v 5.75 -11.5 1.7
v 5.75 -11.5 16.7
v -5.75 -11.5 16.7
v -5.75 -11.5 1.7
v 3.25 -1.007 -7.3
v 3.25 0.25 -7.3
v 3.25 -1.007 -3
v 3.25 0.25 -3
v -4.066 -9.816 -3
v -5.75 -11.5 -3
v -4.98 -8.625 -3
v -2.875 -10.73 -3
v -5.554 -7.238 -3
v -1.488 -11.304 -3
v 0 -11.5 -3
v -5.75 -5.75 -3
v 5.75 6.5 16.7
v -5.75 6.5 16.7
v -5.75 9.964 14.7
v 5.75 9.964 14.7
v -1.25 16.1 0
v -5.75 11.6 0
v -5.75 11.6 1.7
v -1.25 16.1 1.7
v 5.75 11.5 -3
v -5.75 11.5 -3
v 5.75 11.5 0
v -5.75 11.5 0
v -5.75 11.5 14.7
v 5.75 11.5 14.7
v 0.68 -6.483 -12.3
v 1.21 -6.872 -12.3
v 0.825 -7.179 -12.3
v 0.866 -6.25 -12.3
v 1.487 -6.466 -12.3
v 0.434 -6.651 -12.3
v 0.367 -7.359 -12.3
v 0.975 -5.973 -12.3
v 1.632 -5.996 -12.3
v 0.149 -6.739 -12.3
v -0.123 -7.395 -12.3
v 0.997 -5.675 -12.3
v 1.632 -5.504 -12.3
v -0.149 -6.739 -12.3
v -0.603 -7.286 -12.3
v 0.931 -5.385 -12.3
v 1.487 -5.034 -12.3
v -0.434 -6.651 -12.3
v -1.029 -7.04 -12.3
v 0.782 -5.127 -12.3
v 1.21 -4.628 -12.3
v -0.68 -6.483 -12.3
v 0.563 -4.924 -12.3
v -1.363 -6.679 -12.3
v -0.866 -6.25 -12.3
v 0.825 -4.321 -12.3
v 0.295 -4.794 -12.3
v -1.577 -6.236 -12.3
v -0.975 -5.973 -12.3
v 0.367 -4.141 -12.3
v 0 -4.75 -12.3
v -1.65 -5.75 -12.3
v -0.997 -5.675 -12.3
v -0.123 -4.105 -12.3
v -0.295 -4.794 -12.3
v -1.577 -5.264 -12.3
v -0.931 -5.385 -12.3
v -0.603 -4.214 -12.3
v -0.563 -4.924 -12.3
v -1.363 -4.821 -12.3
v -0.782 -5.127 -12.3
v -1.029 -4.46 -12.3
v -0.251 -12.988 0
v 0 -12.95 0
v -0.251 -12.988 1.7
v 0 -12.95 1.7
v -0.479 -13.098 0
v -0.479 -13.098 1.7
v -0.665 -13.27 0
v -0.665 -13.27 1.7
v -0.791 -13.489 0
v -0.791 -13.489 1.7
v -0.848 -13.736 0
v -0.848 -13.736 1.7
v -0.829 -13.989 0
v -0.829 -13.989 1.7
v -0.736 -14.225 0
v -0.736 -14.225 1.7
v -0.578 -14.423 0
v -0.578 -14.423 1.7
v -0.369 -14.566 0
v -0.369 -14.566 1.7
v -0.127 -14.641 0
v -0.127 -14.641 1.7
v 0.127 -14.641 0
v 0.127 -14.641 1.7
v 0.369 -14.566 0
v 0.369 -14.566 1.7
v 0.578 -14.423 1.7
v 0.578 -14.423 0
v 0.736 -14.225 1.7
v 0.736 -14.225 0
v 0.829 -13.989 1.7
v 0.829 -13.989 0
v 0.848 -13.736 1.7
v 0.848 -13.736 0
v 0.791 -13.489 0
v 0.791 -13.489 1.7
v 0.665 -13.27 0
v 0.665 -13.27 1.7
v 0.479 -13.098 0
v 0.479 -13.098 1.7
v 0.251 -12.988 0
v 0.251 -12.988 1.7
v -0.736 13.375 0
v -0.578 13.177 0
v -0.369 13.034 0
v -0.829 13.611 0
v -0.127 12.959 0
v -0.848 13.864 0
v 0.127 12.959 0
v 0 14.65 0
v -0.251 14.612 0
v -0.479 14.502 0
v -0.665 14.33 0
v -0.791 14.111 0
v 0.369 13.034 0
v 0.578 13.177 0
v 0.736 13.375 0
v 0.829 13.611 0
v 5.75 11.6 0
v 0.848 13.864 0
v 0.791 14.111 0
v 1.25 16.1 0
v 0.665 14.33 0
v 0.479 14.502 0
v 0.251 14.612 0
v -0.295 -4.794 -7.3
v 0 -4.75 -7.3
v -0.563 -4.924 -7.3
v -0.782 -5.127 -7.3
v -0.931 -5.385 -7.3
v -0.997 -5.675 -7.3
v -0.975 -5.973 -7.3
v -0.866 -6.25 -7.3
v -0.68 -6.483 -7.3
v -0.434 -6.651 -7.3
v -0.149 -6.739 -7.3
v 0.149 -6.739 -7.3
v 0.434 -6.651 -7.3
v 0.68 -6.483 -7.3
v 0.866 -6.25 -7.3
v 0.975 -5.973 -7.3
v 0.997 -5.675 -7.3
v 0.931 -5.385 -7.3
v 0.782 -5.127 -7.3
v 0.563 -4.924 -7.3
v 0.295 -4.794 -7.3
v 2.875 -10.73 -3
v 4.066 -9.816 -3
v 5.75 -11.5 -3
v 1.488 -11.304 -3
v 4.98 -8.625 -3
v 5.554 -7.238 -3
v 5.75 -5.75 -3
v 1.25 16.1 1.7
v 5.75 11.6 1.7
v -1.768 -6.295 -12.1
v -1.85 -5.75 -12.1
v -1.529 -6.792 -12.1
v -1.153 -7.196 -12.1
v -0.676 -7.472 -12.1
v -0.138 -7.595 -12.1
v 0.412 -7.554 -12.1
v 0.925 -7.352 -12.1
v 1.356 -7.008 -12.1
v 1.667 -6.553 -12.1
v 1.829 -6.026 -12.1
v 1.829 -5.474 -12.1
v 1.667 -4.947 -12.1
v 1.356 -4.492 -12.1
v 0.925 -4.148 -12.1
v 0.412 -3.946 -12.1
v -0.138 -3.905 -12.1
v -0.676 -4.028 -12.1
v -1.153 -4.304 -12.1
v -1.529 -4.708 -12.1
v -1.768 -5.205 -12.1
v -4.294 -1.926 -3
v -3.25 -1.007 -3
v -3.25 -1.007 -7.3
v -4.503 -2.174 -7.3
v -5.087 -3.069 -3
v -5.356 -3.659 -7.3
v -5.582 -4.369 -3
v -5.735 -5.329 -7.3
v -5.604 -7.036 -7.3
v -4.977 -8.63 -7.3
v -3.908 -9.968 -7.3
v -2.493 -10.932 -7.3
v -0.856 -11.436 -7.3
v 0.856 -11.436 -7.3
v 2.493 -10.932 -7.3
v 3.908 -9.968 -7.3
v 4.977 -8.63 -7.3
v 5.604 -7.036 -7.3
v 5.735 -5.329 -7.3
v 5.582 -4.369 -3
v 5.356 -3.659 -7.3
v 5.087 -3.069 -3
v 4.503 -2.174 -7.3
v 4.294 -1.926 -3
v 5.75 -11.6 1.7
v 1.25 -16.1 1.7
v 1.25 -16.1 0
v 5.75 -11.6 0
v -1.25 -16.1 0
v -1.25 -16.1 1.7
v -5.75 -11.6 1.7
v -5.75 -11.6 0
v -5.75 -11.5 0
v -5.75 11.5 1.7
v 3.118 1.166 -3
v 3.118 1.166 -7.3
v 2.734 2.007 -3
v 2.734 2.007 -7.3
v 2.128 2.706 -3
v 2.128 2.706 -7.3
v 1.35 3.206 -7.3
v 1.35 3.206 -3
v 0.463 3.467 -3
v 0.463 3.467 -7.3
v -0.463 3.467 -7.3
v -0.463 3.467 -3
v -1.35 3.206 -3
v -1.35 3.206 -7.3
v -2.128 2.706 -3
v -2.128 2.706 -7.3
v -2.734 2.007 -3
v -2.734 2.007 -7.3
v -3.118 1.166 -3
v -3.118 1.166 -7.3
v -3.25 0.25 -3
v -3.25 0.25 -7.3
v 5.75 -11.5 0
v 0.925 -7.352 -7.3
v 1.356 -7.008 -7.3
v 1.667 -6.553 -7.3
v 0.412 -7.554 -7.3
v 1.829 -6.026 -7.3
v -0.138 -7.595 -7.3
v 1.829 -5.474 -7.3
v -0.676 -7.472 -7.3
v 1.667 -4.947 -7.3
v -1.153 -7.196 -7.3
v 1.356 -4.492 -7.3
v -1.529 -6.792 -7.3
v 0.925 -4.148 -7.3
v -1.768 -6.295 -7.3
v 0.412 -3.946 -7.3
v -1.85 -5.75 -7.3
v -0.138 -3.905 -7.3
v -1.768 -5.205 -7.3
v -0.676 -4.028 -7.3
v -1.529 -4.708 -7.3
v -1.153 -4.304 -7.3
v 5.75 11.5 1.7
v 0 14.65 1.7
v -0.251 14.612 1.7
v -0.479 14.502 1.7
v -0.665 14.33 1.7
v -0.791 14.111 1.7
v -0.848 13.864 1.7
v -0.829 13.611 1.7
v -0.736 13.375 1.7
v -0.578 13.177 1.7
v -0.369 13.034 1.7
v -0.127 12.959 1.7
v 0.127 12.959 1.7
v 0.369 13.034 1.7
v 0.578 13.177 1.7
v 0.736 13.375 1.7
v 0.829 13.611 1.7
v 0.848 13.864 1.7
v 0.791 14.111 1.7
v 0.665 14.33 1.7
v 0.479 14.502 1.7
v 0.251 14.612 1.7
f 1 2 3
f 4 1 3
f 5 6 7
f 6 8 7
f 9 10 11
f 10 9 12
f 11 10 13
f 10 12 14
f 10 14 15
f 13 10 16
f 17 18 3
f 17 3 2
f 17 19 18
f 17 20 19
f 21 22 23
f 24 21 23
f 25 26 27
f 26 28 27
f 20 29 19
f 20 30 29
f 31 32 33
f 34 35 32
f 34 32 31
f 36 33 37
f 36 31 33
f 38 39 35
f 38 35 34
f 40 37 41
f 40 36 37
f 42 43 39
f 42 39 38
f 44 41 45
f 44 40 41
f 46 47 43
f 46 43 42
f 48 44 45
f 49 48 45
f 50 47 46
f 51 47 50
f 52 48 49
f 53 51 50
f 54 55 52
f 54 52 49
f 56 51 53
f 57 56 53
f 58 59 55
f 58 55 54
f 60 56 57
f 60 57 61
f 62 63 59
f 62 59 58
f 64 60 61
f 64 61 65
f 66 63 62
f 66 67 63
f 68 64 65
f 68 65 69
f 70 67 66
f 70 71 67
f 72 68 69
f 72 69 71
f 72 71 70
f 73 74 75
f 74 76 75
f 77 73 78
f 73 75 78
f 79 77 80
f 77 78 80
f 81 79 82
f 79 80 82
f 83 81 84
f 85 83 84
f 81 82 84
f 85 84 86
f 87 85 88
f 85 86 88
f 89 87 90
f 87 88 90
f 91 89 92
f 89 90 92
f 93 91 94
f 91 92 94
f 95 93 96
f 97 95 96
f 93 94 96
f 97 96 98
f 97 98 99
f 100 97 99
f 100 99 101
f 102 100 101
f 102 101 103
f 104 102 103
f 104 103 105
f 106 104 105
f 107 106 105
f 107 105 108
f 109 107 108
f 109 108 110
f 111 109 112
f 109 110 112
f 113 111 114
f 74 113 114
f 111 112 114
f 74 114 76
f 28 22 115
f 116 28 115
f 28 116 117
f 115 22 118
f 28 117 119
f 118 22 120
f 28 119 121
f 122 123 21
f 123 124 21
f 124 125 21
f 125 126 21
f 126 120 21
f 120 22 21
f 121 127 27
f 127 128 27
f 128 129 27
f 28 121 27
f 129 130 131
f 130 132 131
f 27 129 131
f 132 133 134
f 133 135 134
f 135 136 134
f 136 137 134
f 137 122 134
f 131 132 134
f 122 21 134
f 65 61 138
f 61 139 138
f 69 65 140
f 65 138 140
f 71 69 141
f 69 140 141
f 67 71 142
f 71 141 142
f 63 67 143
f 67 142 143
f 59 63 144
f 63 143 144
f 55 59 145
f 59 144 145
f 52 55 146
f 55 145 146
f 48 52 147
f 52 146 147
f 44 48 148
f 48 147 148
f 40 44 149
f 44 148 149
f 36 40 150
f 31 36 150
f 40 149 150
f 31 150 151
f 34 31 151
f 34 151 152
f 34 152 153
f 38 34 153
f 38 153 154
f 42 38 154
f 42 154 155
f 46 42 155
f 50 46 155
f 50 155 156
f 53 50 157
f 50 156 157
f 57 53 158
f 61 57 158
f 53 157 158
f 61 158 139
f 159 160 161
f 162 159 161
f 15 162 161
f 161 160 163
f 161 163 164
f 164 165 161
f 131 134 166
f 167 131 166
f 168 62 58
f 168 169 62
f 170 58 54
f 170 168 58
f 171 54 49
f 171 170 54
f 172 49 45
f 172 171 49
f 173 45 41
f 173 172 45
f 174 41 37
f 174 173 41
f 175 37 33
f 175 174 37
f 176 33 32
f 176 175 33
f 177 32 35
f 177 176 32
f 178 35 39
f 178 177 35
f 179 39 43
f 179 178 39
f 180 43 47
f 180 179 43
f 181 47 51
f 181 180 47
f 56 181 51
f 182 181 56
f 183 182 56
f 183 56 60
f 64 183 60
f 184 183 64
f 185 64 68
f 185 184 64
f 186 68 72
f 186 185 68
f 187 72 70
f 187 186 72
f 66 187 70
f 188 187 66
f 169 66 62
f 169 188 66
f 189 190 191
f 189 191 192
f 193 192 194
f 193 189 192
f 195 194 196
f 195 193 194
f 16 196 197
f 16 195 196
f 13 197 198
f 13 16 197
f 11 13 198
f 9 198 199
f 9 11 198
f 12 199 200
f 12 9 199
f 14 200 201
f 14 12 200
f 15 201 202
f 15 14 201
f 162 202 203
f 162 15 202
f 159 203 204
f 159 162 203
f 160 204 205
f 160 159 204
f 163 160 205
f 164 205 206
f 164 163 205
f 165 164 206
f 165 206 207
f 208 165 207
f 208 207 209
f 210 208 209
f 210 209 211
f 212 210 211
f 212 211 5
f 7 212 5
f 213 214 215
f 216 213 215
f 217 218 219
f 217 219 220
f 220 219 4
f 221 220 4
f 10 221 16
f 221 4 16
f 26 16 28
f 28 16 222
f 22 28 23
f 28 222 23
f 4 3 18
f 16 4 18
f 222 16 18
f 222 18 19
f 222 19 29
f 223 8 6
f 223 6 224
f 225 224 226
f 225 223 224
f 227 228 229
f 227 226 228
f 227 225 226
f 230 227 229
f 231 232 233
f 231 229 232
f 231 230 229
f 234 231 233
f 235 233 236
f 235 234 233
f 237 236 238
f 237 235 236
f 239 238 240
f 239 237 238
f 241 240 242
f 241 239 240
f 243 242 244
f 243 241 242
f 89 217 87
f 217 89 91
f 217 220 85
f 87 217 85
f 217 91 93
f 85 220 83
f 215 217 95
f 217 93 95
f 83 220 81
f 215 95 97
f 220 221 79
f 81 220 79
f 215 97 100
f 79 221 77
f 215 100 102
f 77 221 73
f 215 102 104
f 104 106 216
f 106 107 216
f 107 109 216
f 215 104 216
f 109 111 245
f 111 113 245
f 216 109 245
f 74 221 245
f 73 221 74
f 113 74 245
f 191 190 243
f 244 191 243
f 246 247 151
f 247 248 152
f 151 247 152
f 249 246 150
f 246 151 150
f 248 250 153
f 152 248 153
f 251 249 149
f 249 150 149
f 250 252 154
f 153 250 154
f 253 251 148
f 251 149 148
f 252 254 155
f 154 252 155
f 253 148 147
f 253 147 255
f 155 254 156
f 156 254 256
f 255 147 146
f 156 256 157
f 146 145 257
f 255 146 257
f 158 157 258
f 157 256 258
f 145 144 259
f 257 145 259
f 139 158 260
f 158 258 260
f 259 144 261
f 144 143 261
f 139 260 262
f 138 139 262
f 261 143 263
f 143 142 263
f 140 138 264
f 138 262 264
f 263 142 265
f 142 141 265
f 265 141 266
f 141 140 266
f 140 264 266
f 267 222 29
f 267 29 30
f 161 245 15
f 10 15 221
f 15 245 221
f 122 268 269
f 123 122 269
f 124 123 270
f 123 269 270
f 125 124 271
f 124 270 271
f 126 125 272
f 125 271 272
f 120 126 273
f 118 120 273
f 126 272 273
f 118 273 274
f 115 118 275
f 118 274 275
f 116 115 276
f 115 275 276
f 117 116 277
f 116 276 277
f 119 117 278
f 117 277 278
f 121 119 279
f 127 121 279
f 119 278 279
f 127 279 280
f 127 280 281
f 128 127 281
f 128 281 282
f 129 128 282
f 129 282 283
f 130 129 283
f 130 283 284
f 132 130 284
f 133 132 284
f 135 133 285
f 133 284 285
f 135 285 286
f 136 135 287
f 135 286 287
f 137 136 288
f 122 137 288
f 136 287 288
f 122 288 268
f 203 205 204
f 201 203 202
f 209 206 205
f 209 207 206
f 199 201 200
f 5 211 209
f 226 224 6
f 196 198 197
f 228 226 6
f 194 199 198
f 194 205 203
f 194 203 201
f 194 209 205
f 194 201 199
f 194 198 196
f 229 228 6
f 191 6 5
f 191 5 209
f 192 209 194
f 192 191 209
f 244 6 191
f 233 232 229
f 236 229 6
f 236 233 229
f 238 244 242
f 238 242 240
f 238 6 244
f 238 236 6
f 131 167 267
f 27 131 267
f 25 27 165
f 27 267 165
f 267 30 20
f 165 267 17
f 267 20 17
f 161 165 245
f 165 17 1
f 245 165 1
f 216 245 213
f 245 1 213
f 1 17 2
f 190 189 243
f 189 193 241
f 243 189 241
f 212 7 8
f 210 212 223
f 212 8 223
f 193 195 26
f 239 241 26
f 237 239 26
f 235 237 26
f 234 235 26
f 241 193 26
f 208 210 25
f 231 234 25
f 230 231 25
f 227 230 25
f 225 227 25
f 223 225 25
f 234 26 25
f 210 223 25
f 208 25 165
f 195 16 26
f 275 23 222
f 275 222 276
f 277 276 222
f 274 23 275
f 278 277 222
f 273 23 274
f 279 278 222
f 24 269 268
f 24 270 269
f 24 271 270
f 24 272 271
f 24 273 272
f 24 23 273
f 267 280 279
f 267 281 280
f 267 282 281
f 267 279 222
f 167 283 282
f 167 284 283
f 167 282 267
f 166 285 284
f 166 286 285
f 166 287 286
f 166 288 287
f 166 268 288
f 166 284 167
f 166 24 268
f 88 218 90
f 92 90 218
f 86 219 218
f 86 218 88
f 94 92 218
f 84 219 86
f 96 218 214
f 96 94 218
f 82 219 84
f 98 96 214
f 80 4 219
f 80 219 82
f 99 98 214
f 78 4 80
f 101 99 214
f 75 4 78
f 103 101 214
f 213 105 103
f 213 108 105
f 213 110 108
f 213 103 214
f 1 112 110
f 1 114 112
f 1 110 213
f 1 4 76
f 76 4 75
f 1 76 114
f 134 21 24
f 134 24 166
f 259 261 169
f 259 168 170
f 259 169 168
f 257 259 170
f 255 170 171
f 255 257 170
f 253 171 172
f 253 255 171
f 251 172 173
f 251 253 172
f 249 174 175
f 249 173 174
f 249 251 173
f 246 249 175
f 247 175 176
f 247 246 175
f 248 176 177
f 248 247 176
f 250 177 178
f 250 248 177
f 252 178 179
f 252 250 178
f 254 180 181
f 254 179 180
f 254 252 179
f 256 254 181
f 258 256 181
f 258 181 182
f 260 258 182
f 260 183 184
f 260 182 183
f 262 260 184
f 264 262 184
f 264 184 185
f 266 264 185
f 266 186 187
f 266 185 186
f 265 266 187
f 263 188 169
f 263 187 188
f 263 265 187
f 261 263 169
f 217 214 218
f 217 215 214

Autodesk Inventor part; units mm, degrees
ref_plane "YZ Plane" through (0, 0, 0) normal (1, 0, 0) x (0, 1, 0)
ref_plane "XZ Plane" through (0, 0, 0) normal (0, 1, 0) x (-1, 0, 0)
ref_plane "XY Plane" through (0, 0, 0) normal (0, 0, 1) x (1, 0, 0)
sketch "Skizze1" plane through (0, 0, 0) normal (0, 0, 1) x (1, 0, 0)
  line L0 (5.75, 11.5) -> (5.75, -11.5)
  line L1 (5.75, -11.5) -> (-5.75, -11.5)
  line L2 (-5.75, -11.5) -> (-5.75, 11.5)
  line L3 (-5.75, 11.5) -> (5.75, 11.5)
  line L4 (5.75, -11.5) -> (-5.75, 11.5) construction
  line L5 (-5.75, -11.5) -> (5.75, 11.5) construction
  point P0 (0, 0)
  point P1 (0, 0)
  point P2 (0, 0)
  point P3 (0, 0)
  dimension "d34" = 11.5
  dimension "d35" = 23
extrude "Extrusion1" add sketch "Skizze1" against normal blind 3
sketch "Skizze2" plane through (0, 0, 0) normal (0, 0, 1) x (1, 0, 0)
  line L0 (5.75, 11.5) -> (-5.75, 11.5) projected
  line L1 (-5.75, -11.5) -> (5.75, -11.5) projected
  line L2 (-5.75, 16.1) -> (5.75, 16.1)
  line L3 (5.75, 16.1) -> (5.75, 11.5)
  line L4 (5.75, -16.1) -> (-5.75, -16.1)
  line L5 (-5.75, -16.1) -> (-5.75, -11.5)
  line L6 (5.75, -11.5) -> (5.75, -16.1)
  line L7 (-5.75, 11.5) -> (-5.75, 16.1)
  point P0 (0, 0)
  dimension "d58" = 32.2
extrude "Extrusion2" add sketch "Skizze2" along normal blind 1.7
sketch "Skizze3" plane through (0, 0, 1.7) normal (0, 0, 1) x (1, 0, 0)
  line L0 (5.75, 11.5) -> (5.75, -11.5) projected
  line L1 (5.75, -11.5) -> (-5.75, -11.5) projected
  line L2 (-5.75, -11.5) -> (-5.75, 11.5) projected
  line L3 (-5.75, 11.5) -> (5.75, 11.5) projected
  point P0 (0, 0)
extrude "Extrusion3" add sketch "Skizze3" along normal blind 15 and the other way blind 2
sketch "Skizze4" plane through (0, 0, -3) normal (0, 0, -1) x (-1, 0, 0)
  line L0 (-5.75, -11.5) -> (5.75, -11.5) projected
  line L1 (5.75, 11.5) -> (-5.75, 11.5) projected
  circle A0 centre (0, -5.75) radius 5.75
  line L2 (0, 11.5) -> (0, -11.5) construction
  line L3 (0, -5.75) -> (0, 0.25) construction
  line L4 (3.25, -5.75) -> (3.25, 0.25)
  line L5 (-3.25, 0.25) -> (-3.25, -5.75)
  arc A1 (-3.25, -5.75) -> (3.25, -5.75) centre (0, -5.75) ccw
  arc A2 (3.25, 0.25) -> (-3.25, 0.25) centre (0, 0.25) ccw
  line L6 (-5.75, 11.5) -> (-5.75, -11.5) projected
  point P0 (0, 0)
  point P1 (0, -2.75)
  dimension "d32" = 6.5
  dimension "d33" = 15
extrude "Extrusion4" add sketch "Skizze4" along normal blind 4.3 contours A0 L5 A1 L4 | L5 A2 L4 A0 | A0 L4 A1 L5
sketch "Skizze5" plane through (0, 0, -3) normal (0, 0, -1) x (-1, 0, 0)
  circle A0 centre (0, -5.75) radius 5.75 projected
  line L0 (-5.75, 11.5) -> (-5.75, -11.5) projected
  line L1 (-5.75, -11.5) -> (5.75, -11.5) projected
  line L2 (5.75, -11.5) -> (5.75, 11.5) projected
  line L3 (5.75, 11.5) -> (-5.75, 11.5) projected
  point P0 (0, 0)
sketch "Skizze7" plane through (0, 0, 0) normal (0, 0, -1) x (-1, 0, 0)
  line L0 (0, -11.5) -> (5.75, -11.5) projected
  line L1 (-5.75, -11.5) -> (5.75, -11.5) projected
  line L2 (-8.05, 0) -> (8.05, 0) construction
  point P0 (0, 0)
  point P1 (0, -13.8)
  point P2 (0, 13.8)
  dimension "d59" = 27.6
hole "Bohrung1" at (0, -13.8, 0) at (0, 13.8, 0) direction (0, 0, 1) diameter 1.7 end through all
sketch "Skizze9" plane through (0, 0, -7.3) normal (0, 0, -1) x (-1, 0, 0)
  arc A0 (-3.25, -1.0066) -> (3.25, -1.0066) centre (0, -5.75) ccw projected
  circle A1 centre (0, -5.75) radius 1.85
  point P0 (0, 0)
  dimension "d36" = 3.7
extrude "Extrusion6" add sketch "Skizze9" along normal blind 5 separate body
chamfer "Fase1" distance 0.2 angle 45 1 edges at (1.85, -5.75, -12.3)
sketch "Skizze10" plane through (5.75, 11.5, 0) normal (1, 0, 0) x (0, 0, -1)
  line L0 (-1.7, 0) -> (-16.7, 0) projected
  line L1 (-16.7, -23) -> (-16.7, 0) projected
  line L2 (0, 4.6) -> (0, -27.6) projected
  line L3 (-14.7, 0) -> (-14.7, -1.5359)
  line L4 (-14.7, -1.5359) -> (-16.7, -5)
  point P0 (0, -23)
  point P1 (0, -11.5)
  point P2 (1.7, 0)
  dimension "d42" = 30
  dimension "d43" = 2
  dimension "d44" = 5
extrude "Extrusion7" cut sketch "Skizze10" against normal through all bodies 1
hole "Bohrung2" at (0, -5.75, -12.3) direction (0, 0, 1) diameter 2 depth 5 tip angle 118 bodies 2
chamfer "Chamfer2" distance 4.5 angle 45 4 edges at (-5.75, -16.1, 0.85) (5.75, -16.1, 0.85) (-5.75, 16.1, 0.85) (5.75, 16.1, 0.85)
properties part number "Servo ES08MA2" material "ABS-Kunststoff - Schwarz"
